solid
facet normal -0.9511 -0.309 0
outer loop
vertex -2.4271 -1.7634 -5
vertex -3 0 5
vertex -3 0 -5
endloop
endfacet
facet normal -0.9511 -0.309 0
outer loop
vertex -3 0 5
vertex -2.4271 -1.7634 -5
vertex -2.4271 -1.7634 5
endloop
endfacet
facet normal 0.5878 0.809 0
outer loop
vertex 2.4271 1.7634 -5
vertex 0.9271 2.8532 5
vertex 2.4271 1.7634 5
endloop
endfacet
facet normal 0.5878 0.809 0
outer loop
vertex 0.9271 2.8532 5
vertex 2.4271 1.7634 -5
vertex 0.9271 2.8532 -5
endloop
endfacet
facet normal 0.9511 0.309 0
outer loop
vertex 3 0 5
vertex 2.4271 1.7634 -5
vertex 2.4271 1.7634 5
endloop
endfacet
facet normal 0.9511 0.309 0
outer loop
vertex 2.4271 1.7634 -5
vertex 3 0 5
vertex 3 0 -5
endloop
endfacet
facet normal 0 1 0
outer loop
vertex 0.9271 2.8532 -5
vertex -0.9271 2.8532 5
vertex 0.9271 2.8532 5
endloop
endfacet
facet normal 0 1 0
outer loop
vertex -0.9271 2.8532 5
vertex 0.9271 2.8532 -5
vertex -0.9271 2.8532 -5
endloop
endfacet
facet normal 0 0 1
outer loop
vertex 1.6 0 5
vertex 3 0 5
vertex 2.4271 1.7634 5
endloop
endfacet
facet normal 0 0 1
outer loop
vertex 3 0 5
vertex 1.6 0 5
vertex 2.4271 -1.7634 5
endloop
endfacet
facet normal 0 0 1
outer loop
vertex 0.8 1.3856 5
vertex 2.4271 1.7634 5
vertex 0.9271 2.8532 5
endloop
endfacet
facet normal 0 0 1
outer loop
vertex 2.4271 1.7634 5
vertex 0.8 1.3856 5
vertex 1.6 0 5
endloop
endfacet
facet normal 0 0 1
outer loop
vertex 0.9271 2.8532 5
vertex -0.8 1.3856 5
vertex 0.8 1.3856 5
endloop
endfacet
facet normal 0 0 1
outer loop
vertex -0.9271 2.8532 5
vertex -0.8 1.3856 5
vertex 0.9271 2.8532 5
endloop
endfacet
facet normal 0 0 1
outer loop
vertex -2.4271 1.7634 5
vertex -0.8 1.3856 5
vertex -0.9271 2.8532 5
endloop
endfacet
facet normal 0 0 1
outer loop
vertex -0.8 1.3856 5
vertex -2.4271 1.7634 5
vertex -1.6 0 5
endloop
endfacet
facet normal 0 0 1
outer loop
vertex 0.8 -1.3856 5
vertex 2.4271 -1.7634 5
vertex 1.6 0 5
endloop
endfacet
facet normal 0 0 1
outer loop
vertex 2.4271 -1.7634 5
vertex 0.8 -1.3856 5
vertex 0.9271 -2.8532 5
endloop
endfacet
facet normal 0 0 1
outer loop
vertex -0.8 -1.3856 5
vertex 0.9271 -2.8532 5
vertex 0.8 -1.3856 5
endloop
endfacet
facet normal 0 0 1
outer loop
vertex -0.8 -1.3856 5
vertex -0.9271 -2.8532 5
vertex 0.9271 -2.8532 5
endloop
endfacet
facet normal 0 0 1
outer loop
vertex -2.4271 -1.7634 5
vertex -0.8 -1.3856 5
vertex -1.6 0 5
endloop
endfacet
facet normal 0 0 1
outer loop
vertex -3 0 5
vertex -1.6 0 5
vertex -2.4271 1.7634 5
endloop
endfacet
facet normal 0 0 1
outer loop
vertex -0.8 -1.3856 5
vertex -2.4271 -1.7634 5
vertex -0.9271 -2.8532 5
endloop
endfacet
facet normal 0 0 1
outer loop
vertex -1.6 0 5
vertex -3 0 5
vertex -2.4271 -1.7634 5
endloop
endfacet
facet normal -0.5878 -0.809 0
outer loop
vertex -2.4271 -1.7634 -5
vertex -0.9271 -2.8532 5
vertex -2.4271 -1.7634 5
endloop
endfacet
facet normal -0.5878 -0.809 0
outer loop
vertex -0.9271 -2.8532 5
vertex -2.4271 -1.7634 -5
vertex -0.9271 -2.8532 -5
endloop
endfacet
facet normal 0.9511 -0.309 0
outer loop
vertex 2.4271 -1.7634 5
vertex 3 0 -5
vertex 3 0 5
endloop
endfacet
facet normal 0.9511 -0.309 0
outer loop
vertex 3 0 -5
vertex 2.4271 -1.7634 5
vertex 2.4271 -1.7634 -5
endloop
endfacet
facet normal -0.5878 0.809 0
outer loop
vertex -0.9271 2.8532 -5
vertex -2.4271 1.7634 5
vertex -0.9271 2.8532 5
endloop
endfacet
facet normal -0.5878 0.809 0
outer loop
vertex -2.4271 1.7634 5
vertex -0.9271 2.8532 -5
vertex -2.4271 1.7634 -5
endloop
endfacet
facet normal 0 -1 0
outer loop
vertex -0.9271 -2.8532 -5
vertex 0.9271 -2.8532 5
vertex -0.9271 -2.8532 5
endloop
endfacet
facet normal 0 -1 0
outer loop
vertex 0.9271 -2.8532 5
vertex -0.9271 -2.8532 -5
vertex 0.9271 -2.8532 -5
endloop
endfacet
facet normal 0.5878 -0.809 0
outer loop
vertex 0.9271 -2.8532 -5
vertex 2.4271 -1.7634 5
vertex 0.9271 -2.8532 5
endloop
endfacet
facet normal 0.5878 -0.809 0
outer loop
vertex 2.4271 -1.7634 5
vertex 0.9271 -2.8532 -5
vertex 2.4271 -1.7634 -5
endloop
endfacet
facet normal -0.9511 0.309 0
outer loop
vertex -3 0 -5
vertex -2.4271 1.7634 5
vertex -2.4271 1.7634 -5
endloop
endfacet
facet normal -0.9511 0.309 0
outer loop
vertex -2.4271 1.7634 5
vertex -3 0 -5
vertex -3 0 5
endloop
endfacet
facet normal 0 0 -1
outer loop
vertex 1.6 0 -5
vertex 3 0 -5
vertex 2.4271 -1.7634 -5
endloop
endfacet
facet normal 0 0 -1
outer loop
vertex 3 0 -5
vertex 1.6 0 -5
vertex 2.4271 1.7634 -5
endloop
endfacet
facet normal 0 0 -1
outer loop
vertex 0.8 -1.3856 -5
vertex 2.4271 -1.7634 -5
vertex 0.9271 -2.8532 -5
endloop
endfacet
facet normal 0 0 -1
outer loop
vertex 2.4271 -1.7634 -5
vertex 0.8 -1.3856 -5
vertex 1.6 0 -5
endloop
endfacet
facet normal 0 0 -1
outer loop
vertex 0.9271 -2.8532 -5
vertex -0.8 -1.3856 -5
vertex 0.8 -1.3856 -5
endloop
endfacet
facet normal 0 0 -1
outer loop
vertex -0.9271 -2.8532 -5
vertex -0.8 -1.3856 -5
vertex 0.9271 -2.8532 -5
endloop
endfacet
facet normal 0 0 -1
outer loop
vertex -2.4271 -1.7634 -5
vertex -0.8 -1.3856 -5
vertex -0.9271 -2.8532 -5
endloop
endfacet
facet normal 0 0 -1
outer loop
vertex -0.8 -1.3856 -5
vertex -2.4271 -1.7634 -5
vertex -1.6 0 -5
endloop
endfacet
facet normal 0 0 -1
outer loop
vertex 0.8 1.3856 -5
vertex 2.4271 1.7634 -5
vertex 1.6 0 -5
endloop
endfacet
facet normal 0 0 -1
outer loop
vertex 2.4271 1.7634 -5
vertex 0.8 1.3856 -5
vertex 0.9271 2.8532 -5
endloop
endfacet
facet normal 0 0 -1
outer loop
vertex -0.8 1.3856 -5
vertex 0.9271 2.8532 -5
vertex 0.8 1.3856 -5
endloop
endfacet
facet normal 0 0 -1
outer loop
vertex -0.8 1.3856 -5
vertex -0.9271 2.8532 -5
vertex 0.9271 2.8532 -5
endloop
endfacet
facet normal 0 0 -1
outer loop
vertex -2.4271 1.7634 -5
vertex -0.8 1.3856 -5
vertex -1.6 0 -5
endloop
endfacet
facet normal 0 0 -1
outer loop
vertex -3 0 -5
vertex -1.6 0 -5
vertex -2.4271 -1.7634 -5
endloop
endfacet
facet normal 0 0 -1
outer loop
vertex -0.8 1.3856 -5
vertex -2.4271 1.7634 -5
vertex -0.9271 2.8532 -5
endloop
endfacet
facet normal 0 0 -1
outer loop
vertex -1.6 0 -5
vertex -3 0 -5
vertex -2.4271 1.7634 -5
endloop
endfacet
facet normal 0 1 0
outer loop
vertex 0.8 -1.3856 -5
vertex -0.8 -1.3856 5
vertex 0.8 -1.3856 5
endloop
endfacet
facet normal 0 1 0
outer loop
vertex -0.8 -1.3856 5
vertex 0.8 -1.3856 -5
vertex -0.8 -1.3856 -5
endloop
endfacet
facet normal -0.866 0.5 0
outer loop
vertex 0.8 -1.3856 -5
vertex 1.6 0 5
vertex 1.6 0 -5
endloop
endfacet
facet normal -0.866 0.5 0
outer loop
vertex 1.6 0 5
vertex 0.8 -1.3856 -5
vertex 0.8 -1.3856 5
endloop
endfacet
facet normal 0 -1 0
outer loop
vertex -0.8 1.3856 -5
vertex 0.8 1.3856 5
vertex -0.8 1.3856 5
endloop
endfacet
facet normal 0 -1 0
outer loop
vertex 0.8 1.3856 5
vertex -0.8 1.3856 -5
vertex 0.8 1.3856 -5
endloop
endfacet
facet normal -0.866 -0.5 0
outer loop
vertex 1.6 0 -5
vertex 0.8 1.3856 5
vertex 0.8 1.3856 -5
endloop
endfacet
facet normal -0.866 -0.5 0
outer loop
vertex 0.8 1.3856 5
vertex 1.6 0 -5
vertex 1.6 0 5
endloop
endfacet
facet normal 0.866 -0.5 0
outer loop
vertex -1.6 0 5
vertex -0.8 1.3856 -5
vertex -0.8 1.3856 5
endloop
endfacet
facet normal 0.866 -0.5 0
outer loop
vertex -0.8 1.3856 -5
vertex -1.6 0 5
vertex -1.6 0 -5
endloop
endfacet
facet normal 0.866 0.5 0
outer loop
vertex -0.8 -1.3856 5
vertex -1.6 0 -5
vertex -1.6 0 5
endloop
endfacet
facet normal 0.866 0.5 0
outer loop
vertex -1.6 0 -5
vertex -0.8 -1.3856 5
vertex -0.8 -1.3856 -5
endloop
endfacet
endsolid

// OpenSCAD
// Parameters
thread_diameter_mm = 3.0; //[1.5:6.0:0.1]
length_mm = 10.0; //[5.0:20.0:0.5]
outer_diameter_mm = 6.0; //[3.5:12.0:0.5]
hole_extra_mm = 0.2; //[0.0:0.6:0.05]
cut_extra_z_mm = 1.0; //[0.5:3.0:0.5]

// Standoff - complete geometry
module standoff() {
  color("Silver") {
    // Outer body
    cylinder(h=length_mm, r=outer_diameter_mm/2, center=true);
  }
}

// Pillar - complete geometry
module pillar() {
  color("DimGray") {
    // Through-hole for thread representation
    cylinder(h=length_mm + cut_extra_z_mm, r=(thread_diameter_mm + hole_extra_mm)/2, center=true);
  }
}

// Assembly
module assembly() {
  difference() {
    standoff();
    pillar();
  }
}

assembly();
